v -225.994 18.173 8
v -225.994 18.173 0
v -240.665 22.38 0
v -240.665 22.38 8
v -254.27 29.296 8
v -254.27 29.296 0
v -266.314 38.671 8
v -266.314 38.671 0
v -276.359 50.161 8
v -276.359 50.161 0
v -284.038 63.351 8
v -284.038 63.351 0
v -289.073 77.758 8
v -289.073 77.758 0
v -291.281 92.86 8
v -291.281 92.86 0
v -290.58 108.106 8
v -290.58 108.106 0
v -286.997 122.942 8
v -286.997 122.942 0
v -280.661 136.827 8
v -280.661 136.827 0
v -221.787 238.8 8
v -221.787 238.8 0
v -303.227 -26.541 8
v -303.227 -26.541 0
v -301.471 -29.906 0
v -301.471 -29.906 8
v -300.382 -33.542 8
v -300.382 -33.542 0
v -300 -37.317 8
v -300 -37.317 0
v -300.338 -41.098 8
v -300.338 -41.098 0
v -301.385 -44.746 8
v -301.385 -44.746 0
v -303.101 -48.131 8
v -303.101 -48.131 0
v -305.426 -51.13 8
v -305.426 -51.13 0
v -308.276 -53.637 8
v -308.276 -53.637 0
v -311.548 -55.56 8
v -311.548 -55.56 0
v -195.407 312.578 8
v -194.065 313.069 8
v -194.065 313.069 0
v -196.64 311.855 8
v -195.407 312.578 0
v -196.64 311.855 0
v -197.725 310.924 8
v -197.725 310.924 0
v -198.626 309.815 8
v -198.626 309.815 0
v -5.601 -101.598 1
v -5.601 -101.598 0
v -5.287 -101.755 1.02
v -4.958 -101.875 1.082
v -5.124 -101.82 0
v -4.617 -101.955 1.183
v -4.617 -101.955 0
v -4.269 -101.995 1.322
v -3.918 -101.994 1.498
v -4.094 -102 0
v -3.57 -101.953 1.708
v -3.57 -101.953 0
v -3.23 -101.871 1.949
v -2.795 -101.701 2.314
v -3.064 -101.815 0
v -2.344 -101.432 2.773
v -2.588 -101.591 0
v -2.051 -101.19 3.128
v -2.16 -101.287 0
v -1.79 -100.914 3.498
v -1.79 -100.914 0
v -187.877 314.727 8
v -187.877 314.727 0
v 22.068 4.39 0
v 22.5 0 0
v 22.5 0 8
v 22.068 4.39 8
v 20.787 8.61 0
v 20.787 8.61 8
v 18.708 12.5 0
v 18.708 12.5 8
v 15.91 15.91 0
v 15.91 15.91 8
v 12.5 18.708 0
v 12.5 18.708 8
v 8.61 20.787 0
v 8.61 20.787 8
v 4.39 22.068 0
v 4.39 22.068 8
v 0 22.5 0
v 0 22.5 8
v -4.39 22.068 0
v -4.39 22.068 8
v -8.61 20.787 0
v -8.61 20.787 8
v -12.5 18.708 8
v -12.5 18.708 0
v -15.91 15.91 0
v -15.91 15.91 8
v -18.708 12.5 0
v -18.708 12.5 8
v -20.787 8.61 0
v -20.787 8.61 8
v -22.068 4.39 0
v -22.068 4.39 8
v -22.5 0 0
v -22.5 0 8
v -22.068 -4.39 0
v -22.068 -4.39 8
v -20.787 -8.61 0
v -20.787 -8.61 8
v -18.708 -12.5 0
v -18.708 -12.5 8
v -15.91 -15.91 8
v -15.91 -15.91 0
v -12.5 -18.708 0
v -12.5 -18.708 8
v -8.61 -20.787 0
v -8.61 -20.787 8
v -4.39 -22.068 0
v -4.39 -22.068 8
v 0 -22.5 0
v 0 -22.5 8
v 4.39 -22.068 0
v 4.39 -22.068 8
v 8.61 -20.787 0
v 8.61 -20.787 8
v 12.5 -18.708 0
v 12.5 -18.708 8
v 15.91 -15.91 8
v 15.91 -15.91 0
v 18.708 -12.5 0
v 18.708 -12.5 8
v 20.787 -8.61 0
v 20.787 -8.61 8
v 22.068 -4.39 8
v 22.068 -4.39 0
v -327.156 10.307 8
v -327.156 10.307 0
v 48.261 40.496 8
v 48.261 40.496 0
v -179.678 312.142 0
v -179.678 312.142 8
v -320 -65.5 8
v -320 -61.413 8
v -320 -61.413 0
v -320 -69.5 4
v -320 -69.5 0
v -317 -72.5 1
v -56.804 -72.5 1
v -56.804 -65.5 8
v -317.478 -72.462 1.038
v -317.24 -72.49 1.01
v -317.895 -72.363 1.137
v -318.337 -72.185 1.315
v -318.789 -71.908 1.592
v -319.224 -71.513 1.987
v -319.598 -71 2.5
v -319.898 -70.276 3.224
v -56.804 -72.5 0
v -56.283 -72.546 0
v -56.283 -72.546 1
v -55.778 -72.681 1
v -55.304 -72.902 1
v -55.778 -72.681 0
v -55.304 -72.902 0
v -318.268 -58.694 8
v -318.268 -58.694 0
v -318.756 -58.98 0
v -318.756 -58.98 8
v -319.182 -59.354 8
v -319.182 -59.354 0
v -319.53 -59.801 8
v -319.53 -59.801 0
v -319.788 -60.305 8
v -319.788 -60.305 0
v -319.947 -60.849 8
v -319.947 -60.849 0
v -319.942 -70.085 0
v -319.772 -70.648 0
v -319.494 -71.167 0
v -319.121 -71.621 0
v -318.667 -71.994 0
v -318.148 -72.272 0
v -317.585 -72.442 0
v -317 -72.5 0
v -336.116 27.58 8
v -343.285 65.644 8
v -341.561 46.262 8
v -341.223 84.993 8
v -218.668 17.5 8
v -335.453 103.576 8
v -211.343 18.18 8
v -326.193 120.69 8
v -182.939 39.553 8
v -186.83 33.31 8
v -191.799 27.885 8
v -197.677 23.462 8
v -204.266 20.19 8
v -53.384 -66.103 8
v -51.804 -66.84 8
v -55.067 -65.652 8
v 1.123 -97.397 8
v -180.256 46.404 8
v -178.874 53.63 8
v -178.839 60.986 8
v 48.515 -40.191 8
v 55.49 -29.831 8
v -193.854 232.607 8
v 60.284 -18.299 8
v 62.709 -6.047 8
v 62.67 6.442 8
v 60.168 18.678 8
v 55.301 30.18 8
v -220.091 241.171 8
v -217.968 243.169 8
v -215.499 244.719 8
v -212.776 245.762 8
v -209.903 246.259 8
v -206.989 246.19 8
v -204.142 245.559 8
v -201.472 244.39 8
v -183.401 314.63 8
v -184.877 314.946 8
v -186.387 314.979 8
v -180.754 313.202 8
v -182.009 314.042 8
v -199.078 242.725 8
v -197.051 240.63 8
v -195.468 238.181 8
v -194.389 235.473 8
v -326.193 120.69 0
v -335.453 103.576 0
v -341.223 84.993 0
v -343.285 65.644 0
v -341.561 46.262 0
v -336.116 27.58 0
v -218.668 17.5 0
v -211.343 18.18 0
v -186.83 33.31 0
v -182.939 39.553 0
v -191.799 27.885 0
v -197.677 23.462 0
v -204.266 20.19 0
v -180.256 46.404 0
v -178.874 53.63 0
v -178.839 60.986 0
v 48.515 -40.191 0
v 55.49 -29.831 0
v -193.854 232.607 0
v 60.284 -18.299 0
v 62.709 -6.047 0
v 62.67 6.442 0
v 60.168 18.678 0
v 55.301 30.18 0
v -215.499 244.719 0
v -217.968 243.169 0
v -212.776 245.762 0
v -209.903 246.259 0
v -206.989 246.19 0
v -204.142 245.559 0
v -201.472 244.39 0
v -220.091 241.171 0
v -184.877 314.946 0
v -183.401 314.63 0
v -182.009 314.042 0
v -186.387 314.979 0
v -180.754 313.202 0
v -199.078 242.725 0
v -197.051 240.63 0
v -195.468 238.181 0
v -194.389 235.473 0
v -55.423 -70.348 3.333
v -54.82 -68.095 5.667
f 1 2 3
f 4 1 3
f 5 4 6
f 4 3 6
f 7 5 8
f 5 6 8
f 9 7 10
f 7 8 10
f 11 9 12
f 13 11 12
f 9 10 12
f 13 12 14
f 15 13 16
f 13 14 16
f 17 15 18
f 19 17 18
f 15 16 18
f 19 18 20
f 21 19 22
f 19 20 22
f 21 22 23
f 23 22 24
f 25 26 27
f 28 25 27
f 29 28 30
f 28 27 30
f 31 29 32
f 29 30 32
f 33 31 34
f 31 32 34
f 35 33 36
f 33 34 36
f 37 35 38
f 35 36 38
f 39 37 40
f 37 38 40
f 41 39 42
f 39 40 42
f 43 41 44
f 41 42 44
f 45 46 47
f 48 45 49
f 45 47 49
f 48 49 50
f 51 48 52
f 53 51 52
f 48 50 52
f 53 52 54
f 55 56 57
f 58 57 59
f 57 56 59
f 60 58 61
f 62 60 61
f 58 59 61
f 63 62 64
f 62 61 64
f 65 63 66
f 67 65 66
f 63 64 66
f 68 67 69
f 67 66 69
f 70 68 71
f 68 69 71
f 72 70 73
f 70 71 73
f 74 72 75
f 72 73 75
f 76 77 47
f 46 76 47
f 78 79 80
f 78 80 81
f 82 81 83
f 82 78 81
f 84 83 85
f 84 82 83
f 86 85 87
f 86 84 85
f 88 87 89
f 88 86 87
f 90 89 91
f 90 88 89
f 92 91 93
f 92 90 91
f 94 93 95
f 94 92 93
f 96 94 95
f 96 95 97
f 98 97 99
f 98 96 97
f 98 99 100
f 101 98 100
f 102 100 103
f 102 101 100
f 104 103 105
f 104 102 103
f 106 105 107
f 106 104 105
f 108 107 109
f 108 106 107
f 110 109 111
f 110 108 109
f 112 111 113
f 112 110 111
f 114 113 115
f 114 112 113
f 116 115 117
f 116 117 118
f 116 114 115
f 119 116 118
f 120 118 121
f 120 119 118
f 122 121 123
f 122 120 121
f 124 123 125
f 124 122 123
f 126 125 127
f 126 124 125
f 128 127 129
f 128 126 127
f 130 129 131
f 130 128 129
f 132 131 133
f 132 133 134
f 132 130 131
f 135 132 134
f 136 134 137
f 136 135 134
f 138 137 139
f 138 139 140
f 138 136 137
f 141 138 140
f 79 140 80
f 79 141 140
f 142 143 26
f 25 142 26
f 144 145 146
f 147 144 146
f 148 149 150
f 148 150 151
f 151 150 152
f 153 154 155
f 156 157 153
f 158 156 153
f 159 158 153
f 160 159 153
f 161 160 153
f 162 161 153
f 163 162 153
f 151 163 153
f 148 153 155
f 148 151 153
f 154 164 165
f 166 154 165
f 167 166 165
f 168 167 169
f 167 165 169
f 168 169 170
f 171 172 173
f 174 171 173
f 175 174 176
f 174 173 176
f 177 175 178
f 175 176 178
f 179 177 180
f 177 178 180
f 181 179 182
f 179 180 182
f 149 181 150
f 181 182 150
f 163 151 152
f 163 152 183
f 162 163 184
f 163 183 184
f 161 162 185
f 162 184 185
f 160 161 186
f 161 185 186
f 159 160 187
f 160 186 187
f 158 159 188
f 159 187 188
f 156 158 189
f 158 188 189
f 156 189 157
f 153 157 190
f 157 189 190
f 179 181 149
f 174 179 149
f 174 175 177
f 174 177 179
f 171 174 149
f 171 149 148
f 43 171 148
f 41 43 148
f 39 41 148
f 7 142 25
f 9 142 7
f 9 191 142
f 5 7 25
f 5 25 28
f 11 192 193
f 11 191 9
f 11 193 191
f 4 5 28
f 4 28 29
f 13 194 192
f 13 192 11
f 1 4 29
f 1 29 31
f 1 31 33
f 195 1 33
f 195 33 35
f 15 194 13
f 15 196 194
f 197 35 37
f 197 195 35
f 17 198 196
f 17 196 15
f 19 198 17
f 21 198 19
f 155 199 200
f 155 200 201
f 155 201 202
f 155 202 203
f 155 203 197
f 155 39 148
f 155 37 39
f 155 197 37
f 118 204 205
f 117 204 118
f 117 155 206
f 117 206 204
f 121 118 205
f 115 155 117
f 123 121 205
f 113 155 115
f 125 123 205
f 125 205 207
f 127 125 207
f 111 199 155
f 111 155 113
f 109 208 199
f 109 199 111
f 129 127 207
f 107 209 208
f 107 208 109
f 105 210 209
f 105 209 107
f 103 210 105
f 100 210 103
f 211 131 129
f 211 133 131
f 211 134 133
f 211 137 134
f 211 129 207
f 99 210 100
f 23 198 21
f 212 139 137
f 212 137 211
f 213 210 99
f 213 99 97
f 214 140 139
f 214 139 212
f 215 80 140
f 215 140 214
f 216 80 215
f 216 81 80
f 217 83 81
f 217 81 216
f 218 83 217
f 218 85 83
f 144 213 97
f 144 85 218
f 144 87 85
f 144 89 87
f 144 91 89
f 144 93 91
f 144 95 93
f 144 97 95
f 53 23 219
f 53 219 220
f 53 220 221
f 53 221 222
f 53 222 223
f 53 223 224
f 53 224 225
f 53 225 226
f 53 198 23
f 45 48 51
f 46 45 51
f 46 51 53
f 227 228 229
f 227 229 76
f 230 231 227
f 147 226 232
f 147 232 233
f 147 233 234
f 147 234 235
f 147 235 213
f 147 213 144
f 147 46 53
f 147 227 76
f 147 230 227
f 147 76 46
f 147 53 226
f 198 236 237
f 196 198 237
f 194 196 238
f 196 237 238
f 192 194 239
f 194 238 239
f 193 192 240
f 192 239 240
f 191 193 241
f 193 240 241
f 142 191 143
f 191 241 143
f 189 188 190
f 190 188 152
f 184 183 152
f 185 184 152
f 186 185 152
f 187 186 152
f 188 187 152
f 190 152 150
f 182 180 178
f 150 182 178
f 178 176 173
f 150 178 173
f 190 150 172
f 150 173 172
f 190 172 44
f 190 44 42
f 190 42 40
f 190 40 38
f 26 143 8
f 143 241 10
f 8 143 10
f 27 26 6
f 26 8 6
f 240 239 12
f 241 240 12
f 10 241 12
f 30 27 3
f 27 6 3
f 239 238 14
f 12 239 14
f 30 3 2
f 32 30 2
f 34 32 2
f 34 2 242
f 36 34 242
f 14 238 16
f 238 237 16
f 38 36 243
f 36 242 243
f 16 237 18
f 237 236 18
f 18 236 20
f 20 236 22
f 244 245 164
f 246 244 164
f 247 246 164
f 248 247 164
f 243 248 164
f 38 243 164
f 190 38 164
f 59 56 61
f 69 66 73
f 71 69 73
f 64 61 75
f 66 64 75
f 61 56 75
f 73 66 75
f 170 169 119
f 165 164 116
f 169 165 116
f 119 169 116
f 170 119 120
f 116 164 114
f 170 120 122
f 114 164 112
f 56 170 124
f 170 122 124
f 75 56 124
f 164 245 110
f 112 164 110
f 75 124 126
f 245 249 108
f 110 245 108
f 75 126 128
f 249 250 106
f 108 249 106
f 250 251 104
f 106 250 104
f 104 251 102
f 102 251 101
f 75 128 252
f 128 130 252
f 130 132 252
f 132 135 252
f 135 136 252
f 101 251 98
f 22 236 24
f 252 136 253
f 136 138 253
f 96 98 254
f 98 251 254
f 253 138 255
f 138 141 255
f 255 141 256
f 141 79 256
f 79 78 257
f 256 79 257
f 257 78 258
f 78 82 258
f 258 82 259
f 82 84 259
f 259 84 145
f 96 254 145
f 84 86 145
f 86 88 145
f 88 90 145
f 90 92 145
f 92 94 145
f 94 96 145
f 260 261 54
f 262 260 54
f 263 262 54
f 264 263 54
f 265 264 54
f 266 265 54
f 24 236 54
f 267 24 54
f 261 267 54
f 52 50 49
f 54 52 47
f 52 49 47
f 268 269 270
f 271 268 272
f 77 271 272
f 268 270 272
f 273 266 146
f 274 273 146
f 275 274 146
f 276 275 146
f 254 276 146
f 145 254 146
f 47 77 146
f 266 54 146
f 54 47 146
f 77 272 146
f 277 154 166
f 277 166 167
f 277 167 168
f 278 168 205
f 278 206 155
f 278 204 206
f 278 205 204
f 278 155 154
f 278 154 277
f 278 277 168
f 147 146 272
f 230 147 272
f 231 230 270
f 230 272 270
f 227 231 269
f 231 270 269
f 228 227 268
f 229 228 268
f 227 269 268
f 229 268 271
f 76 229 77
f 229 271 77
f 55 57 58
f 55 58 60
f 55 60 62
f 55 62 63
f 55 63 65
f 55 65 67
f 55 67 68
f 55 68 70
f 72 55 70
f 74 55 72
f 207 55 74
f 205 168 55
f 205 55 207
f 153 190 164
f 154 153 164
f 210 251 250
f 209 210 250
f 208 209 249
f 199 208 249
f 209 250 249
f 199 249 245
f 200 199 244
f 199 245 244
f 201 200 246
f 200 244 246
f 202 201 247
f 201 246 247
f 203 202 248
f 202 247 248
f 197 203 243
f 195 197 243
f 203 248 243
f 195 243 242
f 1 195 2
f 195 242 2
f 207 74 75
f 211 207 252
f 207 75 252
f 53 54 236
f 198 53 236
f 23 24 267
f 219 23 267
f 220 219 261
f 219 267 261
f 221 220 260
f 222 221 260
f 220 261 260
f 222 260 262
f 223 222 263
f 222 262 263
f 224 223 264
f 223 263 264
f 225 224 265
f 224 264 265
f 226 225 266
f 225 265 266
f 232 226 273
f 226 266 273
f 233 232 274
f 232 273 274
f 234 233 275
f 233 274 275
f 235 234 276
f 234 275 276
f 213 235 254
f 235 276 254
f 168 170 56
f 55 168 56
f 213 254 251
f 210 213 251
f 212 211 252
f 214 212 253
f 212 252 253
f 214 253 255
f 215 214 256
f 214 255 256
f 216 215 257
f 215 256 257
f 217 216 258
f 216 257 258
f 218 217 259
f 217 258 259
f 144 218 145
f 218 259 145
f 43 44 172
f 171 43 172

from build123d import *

# Parameters (mm, degrees)
SKETCH1_R                          = 22.5
EXTRUDE1_DEPTH                     = 8
F_7_X_45_GR_SK_RPNING_VENSTRE_SIZE = 7


with BuildPart() as part:
    # Sketch1 → Extrude1 (new body)
    with BuildSketch(Plane.XY):
        with BuildLine():
            Line((-317, -72.5), (-56.803847577, -72.5))
            ThreePointArc((-56.803847577, -72.5), (-56.027390442, -72.602222521), (-55.303847577, -72.901923789))
            Line((-55.303847577, -72.901923789), (-5.600653599, -101.598076211))
            ThreePointArc((-5.600653599, -101.598076211), (-3.570421982, -101.952770637), (-1.790438983, -100.913872625))
            Line((-1.790438983, -100.913872625), (48.51450695, -40.191325127))
            ThreePointArc((48.51450695, -40.191325127), (62.999688566, 0.19809232), (48.260799916, 40.49561941))
            Line((48.260799916, 40.49561941), (-179.677830313, 312.142300877))
            ThreePointArc((-179.677830313, 312.142300877), (-183.400539462, 314.629735606), (-187.876738219, 314.72740661))
            Line((-187.876738219, 314.72740661), (-194.064678331, 313.069353055))
            ThreePointArc((-194.064678331, 313.069353055), (-196.639749615, 311.854870591), (-198.62642655, 309.815489672))
            Line((-198.62642655, 309.815489672), (-326.192869732, 120.690460119))
            ThreePointArc((-326.192869732, 120.690460119), (-343.285304783, 65.643823322), (-327.156169271, 10.30726627))
            Line((-327.156169271, 10.30726627), (-303.226588641, -26.54105654))
            ThreePointArc((-303.226588641, -26.54105654), (-300.774766081, -42.946584357), (-311.547634765, -55.559992981))
            Line((-311.547634765, -55.559992981), (-318.267854785, -58.693683041))
            ThreePointArc((-318.267854785, -58.693683041), (-319.530174337, -59.800707577), (-320, -61.412606402))
            Line((-320, -61.412606402), (-320, -69.5))
            ThreePointArc((-320, -69.5), (-319.121320344, -71.621320344), (-317, -72.5))
        make_face()
        Circle(SKETCH1_R, mode=Mode.SUBTRACT)
        with BuildLine():
            Line((-193.85365949, 232.607111101), (-178.838777944, 60.98622971))
            ThreePointArc((-178.838777944, 60.98622971), (-191.798712106, 27.885082811), (-225.99409877, 18.173164851))
            ThreePointArc((-225.99409877, 18.173164851), (-284.038197126, 63.350786049), (-280.661065267, 136.826835149))
            Line((-280.661065267, 136.826835149), (-221.786961018, 238.79977496))
            ThreePointArc((-221.786961018, 238.79977496), (-205.549985752, 245.944215066), (-193.85365949, 232.607111101))
        make_face(mode=Mode.SUBTRACT)
    extrude(amount=EXTRUDE1_DEPTH)

    # 7 x 45 gr skærpning - Venstre
    # the kernel refuses this chamfer: 7 mm, written as the material it takes off along each edge
    with BuildSketch(Plane(origin=(-55.303847577, -72.901923789, 8), x_dir=(-0.013747938305292761, -0.02381212764408935, -0.9996219169112969), z_dir=(0.8660254037844379, -0.5000000000000012, 0))) as f_7_x_45_gr_sk_rpning_venstre_piece_1:
        Polygon((F_7_X_45_GR_SK_RPNING_VENSTRE_SIZE * 0.999621916911, F_7_X_45_GR_SK_RPNING_VENSTRE_SIZE * 0.0274958766106), (-F_7_X_45_GR_SK_RPNING_VENSTRE_SIZE * 0.0274958766106, F_7_X_45_GR_SK_RPNING_VENSTRE_SIZE * 0.999621916911), (0, 0), align=None)
    extrude(amount=75.394085761, mode=Mode.SUBTRACT)
    with BuildSketch(Plane(origin=(-56.803847577, -75.5, 8), x_dir=(0, 1, 0), z_dir=(-1, 0, 0))) as f_7_x_45_gr_sk_rpning_venstre_piece_2:
        Polygon((3, F_7_X_45_GR_SK_RPNING_VENSTRE_SIZE), (3 + F_7_X_45_GR_SK_RPNING_VENSTRE_SIZE, 0), (3, 0), align=None)
    revolve(axis=Axis((-56.803847577, -75.5, 8), (0, 0, -1)), revolution_arc=30, mode=Mode.SUBTRACT)
    with BuildSketch(Plane(origin=(-335.001780916, -72.5, 8), x_dir=(0, -0.02749587661058612, -0.9996219169112968), z_dir=(1, 0, 0))) as f_7_x_45_gr_sk_rpning_venstre_piece_3:
        Polygon((F_7_X_45_GR_SK_RPNING_VENSTRE_SIZE * 0.999621916911, F_7_X_45_GR_SK_RPNING_VENSTRE_SIZE * 0.0274958766106), (-F_7_X_45_GR_SK_RPNING_VENSTRE_SIZE * 0.0274958766106, F_7_X_45_GR_SK_RPNING_VENSTRE_SIZE * 0.999621916911), (0, 0), align=None)
    extrude(amount=278.197933338, mode=Mode.SUBTRACT)


solid = part.part
